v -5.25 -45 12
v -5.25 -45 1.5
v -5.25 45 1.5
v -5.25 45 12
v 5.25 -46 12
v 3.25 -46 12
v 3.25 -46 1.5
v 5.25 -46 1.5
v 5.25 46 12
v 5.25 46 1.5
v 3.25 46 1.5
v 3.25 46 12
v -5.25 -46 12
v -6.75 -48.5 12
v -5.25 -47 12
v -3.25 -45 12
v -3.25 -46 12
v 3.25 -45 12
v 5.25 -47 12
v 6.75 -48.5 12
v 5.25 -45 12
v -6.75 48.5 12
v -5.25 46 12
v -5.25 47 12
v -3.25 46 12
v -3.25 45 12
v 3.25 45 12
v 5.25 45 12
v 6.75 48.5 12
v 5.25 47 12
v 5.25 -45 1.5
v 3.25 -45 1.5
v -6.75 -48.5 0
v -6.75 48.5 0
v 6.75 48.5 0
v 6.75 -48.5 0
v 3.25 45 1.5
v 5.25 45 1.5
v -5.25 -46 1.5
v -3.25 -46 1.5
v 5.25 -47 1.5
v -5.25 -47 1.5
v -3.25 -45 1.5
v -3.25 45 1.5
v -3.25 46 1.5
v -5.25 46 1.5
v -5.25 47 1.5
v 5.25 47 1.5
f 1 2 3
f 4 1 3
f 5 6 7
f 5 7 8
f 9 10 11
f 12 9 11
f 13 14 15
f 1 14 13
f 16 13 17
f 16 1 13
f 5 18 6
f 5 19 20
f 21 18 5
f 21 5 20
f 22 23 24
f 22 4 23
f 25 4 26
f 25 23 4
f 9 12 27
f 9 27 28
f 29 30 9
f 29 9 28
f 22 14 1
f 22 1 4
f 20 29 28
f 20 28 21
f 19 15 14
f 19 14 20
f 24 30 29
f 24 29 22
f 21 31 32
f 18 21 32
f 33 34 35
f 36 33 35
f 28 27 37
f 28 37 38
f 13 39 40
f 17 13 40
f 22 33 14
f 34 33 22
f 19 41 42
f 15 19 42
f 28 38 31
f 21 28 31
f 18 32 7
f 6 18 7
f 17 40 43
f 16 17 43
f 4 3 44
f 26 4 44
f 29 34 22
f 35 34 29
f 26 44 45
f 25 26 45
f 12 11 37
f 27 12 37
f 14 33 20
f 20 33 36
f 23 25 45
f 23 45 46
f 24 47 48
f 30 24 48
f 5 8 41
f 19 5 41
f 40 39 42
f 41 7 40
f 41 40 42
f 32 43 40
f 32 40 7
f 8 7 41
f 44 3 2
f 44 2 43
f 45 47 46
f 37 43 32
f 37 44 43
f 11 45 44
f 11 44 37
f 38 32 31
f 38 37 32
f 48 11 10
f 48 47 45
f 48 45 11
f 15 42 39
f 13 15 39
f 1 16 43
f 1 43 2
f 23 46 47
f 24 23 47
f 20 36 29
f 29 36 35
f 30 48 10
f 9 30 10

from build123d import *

# Parameters (mm, degrees)
F0_W     = 13.5
F0_H     = 97
F2_DEPTH = 12
F1_W     = 13.5
F1_H     = 97
F3_DEPTH = 1.5


with BuildPart() as f2:
    # F0 (on Top) → F2 (new body)
    with BuildSketch(Plane.XY):
        Rectangle(F0_W, F0_H)
        Polygon((5.25, -46), (5.25, -47), (-5.25, -47), (-5.25, -46), (-3.25, -46), (-3.25, -45), (-5.25, -45), (-5.25, 45), (-3.25, 45), (-3.25, 46), (-5.25, 46), (-5.25, 47), (5.25, 47), (5.25, 46), (3.25, 46), (3.25, 45), (5.25, 45), (5.25, -45), (3.25, -45), (3.25, -46), align=None, mode=Mode.SUBTRACT)
    extrude(amount=F2_DEPTH)

    # F1 (on Top) → F3 (join)
    with BuildSketch(Plane.XY):
        Rectangle(F1_W, F1_H)
    extrude(amount=F3_DEPTH)


solid = f2.part
